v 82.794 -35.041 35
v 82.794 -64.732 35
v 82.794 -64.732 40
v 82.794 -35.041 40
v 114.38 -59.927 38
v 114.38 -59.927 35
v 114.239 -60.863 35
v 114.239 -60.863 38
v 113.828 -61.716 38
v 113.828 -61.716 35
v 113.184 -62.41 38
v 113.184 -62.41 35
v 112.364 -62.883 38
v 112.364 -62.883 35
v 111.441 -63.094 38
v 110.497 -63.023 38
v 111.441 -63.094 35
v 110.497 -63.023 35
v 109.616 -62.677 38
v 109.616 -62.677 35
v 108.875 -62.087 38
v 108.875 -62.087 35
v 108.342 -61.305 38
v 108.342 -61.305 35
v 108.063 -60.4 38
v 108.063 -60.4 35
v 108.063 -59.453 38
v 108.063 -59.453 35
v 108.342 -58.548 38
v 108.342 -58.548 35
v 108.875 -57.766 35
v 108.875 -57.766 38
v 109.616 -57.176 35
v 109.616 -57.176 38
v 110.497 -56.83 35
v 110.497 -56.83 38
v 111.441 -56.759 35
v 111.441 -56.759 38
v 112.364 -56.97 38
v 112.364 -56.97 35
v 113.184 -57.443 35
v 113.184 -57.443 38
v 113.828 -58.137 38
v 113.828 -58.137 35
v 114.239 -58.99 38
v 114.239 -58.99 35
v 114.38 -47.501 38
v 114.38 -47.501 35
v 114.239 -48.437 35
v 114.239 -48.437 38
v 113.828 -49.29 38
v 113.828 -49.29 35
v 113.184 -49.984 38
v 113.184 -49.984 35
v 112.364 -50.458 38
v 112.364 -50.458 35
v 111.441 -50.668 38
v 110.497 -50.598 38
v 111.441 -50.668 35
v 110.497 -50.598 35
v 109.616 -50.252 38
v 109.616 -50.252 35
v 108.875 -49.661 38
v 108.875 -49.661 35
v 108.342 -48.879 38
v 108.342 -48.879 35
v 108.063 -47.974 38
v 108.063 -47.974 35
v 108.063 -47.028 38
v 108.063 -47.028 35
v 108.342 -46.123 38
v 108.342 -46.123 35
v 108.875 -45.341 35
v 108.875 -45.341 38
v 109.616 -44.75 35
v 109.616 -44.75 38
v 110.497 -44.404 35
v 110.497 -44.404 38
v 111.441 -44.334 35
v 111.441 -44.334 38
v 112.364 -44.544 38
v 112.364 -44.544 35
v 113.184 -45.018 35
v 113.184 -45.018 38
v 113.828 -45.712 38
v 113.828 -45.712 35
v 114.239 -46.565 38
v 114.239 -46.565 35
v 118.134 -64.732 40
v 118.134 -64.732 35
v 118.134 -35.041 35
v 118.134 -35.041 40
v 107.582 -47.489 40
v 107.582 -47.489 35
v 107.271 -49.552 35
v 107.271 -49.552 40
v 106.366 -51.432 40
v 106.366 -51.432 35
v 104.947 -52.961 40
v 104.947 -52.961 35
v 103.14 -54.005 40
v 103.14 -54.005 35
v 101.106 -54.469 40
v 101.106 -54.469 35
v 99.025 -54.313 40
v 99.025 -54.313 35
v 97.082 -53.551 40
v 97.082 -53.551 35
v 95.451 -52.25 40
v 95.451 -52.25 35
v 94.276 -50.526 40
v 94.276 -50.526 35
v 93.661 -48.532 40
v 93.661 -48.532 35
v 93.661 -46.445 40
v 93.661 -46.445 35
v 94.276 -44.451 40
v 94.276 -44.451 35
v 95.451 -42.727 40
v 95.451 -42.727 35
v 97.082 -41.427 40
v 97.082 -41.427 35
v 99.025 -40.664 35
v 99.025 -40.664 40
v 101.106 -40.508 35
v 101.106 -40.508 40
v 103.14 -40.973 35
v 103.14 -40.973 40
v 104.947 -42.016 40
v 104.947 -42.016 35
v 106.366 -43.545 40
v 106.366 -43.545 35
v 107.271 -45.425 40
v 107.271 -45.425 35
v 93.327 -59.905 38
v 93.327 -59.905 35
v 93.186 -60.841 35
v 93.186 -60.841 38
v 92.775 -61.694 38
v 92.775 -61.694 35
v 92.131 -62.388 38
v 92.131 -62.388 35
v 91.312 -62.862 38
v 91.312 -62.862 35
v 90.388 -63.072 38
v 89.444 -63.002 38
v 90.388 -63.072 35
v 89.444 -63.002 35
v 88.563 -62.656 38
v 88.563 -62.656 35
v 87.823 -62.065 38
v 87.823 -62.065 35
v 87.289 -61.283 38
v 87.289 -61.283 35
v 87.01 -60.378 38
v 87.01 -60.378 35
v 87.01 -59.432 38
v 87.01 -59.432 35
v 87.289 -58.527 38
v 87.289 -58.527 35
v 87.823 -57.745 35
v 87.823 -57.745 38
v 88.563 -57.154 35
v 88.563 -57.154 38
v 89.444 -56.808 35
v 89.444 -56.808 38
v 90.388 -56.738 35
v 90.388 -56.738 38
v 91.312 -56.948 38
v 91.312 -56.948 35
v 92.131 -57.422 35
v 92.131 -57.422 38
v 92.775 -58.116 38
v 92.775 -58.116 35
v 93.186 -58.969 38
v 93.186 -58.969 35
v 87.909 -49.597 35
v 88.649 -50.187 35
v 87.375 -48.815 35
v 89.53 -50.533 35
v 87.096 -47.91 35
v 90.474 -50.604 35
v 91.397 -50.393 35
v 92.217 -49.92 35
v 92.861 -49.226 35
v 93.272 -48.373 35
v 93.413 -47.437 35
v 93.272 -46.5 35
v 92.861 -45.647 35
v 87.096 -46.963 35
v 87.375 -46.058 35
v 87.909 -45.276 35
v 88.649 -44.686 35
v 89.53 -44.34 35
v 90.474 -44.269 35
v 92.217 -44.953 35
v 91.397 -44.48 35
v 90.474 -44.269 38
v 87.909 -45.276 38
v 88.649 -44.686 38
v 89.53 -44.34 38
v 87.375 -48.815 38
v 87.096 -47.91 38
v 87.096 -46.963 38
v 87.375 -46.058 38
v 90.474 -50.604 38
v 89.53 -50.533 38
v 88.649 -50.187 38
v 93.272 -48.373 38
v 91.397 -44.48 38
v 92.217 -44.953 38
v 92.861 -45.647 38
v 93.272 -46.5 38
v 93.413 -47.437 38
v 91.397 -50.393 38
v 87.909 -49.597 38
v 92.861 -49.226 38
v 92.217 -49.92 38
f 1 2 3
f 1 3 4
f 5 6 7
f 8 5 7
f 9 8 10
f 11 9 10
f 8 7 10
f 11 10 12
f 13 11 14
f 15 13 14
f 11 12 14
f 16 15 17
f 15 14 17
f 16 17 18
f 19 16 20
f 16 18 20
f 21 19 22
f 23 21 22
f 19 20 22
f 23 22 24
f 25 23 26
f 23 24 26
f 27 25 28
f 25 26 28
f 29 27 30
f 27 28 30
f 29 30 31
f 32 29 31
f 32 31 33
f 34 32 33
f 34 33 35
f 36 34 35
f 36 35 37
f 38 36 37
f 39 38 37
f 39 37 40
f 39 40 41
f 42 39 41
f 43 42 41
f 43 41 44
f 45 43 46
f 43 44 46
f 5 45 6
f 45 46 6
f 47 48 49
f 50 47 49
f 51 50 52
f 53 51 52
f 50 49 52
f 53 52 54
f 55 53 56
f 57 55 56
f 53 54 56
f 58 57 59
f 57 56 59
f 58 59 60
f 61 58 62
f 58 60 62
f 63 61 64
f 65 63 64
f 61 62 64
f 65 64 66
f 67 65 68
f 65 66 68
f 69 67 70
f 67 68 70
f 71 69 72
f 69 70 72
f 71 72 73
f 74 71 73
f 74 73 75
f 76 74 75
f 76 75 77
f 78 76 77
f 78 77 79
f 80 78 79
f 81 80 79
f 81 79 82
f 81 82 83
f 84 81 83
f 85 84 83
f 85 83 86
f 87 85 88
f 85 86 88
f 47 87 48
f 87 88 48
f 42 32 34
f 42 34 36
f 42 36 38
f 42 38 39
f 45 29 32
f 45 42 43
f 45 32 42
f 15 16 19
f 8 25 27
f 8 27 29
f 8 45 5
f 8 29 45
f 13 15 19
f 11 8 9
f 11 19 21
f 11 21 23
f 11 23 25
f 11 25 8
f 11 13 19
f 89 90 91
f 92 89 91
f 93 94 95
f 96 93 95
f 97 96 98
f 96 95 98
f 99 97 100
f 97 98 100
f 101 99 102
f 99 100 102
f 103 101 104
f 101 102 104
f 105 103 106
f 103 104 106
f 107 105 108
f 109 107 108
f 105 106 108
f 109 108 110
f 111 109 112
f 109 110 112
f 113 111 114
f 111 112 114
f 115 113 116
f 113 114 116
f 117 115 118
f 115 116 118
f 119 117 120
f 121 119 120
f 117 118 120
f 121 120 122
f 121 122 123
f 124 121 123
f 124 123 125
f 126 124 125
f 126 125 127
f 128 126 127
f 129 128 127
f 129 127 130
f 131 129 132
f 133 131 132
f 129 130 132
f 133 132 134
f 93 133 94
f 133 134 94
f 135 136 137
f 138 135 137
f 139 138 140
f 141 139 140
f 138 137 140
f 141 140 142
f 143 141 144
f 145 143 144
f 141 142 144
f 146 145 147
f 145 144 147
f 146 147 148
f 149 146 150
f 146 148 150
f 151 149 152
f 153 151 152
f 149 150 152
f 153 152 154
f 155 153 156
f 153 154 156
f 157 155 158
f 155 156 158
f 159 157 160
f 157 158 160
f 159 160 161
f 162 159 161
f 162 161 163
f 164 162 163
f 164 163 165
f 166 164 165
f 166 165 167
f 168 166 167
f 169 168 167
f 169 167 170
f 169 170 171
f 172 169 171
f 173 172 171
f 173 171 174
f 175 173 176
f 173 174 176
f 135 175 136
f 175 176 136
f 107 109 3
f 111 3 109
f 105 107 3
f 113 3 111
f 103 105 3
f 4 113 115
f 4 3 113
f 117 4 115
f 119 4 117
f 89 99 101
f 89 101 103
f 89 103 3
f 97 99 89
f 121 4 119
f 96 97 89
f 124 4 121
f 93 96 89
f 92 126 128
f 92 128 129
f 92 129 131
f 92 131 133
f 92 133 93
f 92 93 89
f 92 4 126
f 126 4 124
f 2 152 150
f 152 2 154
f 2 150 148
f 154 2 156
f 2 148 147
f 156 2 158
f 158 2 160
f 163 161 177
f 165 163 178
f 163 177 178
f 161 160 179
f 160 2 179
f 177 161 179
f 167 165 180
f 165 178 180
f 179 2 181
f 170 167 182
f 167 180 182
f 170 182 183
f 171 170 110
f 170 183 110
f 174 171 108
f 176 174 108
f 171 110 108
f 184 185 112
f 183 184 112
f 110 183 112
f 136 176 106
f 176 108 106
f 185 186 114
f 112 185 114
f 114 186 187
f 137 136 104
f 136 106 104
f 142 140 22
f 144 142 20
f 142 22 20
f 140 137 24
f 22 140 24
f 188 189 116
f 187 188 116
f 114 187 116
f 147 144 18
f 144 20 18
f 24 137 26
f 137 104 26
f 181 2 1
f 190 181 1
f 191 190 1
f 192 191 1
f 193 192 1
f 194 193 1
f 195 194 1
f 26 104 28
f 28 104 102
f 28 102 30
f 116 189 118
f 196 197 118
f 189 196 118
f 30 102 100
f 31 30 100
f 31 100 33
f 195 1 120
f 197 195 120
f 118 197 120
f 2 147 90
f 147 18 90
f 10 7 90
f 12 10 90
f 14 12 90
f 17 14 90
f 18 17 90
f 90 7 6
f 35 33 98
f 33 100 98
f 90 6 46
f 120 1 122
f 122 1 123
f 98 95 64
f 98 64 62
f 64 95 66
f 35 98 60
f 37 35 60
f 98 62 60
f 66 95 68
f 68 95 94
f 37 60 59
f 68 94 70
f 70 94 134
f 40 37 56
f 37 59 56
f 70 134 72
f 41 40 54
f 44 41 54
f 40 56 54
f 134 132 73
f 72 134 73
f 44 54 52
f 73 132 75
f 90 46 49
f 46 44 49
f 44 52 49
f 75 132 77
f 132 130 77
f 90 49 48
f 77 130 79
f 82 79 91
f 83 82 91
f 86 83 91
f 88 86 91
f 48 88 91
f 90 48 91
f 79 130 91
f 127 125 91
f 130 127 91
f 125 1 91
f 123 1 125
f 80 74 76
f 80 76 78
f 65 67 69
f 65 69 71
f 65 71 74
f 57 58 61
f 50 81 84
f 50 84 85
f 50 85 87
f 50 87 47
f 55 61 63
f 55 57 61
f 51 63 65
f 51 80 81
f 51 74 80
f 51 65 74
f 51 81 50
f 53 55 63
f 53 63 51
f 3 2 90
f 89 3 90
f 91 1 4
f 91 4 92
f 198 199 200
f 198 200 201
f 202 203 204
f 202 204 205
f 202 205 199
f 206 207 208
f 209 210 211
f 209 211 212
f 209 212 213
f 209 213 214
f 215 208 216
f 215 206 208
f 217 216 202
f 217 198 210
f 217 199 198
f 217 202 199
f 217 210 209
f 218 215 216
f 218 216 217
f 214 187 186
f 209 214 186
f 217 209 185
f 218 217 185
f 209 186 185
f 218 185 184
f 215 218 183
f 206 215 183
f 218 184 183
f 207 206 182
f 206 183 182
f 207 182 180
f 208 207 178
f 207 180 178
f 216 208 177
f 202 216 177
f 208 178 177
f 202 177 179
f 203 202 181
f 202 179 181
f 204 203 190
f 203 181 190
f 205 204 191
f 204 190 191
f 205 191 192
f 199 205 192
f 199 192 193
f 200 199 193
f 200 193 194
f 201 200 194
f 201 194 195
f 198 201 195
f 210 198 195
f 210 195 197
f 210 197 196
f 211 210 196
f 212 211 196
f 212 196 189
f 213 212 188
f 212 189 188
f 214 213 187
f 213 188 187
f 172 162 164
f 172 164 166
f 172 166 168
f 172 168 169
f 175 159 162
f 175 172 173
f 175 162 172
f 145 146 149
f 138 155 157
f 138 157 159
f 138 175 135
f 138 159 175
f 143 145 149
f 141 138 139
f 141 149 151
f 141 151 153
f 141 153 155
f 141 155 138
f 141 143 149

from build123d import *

# Parameters (mm, degrees)
SKETCH032_W     = 35.340293
SKETCH032_H     = 29.690987
PAD011_DEPTH    = 5
SKETCH033_R     = 3.176208
POCKET014_DEPTH = 3
SKETCH034_R     = 7
POCKET015_DEPTH = 5


with BuildPart() as part:
    # Sketch032 → Pad011 (new body)
    with BuildSketch(Plane.XY):
        with Locations((100.463696, -49.886112)):
            Rectangle(SKETCH032_W, SKETCH032_H)
    extrude(amount=PAD011_DEPTH)

    # Sketch033 (on Face5 of Pad011) → Pocket014 (cut)
    with BuildSketch(Plane(origin=(0, 0, 0), x_dir=(1, 0, 0), z_dir=(0, 0, -1))):
        with Locations((90.151108, 59.905067)):
            Circle(SKETCH033_R)
        with Locations((90.236954, 47.436592)):
            Circle(SKETCH033_R)
        with Locations((111.203728, 59.926529)):
            Circle(SKETCH033_R)
        with Locations((111.203728, 47.500977)):
            Circle(SKETCH033_R)
    extrude(amount=-POCKET014_DEPTH, mode=Mode.SUBTRACT)

    # Sketch034 (on Face4 of Pocket014) → Pocket015 (cut)
    with BuildSketch(Plane(origin=(0, 0, 0), x_dir=(1, 0, 0), z_dir=(0, 0, -1))):
        with Locations((100.58239, 47.488678)):
            Circle(SKETCH034_R)
    extrude(amount=-POCKET015_DEPTH, mode=Mode.SUBTRACT)


with BuildPart() as part_1:
    # Body004 placement: moved
    add(part.part.moved(Location((0, 0, 35))))


solid = part_1.part
